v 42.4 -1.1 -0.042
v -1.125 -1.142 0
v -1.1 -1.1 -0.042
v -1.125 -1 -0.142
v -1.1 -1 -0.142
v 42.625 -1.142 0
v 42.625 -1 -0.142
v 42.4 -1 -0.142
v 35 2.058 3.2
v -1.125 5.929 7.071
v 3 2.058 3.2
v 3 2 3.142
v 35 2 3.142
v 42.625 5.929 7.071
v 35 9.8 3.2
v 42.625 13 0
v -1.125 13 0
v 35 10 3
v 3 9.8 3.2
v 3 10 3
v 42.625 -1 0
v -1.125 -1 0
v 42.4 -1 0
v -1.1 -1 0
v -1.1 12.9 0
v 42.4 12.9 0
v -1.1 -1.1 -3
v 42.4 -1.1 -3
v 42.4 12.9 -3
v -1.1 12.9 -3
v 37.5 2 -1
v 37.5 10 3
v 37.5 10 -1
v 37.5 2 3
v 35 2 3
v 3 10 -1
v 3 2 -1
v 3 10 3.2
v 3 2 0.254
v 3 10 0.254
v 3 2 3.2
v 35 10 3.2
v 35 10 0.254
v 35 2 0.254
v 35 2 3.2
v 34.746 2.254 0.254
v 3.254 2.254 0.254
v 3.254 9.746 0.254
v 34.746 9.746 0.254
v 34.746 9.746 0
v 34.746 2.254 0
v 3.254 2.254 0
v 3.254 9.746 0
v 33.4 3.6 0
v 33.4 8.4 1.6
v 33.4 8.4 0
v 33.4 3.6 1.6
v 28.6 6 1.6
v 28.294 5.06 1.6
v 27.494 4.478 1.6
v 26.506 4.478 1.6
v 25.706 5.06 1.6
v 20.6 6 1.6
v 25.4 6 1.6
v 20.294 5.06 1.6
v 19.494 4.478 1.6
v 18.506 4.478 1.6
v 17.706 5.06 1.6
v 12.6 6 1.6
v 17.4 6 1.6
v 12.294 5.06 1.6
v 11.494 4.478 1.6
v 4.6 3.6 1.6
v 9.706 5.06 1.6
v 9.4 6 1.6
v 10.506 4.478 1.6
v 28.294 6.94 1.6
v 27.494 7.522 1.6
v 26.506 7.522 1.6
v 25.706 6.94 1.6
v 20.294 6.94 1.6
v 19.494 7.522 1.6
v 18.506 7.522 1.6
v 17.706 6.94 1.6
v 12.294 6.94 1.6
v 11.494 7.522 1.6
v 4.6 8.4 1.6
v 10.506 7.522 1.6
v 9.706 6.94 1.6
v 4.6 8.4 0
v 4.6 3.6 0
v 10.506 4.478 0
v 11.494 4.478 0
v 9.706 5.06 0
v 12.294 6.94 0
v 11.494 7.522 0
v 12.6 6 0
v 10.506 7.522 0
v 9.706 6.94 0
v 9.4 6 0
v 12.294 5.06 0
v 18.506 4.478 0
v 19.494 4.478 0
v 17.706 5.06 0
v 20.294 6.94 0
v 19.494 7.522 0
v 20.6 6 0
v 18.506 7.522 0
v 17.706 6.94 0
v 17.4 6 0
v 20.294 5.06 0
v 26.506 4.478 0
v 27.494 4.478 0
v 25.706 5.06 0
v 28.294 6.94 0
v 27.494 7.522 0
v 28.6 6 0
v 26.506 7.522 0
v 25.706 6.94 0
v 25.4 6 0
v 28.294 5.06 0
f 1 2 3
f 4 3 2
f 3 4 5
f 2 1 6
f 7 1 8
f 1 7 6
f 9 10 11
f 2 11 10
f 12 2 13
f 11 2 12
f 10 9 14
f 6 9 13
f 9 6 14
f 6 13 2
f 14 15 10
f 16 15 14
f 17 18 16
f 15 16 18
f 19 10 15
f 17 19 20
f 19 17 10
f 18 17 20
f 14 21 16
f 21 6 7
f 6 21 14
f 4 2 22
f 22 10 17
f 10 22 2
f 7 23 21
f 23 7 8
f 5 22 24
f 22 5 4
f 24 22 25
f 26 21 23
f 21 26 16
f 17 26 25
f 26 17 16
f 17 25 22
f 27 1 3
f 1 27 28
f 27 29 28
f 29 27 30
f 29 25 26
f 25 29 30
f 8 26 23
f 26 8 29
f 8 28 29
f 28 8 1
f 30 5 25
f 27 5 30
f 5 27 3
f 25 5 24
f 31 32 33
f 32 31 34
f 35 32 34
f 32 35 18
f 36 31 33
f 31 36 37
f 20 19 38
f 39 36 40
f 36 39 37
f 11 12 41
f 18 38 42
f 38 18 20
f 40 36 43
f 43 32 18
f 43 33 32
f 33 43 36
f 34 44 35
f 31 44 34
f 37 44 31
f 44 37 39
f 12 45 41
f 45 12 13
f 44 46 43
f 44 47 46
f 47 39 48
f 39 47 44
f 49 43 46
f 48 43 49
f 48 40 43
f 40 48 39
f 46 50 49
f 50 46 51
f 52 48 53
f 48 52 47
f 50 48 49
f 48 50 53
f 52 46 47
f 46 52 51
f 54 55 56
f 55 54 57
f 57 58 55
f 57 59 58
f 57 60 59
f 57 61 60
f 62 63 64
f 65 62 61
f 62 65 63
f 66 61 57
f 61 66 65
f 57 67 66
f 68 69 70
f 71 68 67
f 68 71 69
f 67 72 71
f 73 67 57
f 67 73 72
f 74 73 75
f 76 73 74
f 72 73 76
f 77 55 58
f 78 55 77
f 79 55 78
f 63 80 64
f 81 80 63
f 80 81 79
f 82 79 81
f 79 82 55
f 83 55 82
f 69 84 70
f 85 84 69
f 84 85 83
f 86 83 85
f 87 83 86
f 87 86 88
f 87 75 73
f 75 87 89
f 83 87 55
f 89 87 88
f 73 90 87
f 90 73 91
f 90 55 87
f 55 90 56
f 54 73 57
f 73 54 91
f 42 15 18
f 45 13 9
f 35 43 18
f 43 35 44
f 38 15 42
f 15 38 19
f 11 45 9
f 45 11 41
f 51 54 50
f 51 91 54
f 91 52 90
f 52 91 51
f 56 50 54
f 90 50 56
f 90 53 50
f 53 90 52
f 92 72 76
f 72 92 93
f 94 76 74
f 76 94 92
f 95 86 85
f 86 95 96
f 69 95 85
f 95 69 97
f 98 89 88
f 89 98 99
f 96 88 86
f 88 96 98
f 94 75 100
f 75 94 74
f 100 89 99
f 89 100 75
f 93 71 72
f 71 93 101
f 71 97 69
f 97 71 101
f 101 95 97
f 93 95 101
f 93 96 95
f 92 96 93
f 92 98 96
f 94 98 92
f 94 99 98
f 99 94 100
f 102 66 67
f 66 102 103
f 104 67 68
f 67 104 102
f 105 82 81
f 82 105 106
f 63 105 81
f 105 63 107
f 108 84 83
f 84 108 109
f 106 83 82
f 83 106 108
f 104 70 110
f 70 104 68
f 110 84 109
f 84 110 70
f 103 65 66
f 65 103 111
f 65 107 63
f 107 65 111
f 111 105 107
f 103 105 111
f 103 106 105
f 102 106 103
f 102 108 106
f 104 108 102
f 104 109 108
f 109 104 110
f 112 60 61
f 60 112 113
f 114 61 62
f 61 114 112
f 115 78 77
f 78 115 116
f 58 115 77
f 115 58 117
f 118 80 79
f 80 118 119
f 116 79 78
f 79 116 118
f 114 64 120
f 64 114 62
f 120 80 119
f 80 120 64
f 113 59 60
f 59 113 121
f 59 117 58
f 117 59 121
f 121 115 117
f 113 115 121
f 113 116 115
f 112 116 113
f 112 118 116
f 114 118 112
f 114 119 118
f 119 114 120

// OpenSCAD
// file: ../OpenSCAD/brailleAndText.scad
/*
Braille Module
http://creativecommons.org/licenses/by/3.0/
*/


// mm sizes from http://dots.physics.orst.edu/gs_layout.html
radius = 0.25;
spacing = 2.5;
startOffset = 3.75;
distance = startOffset + spacing;

plate_height = 10;
plate_thickness = 10;   // was 2.

$fn = 10;



module letter(bitmap, char) {
//    echo(char);
	row_size = 2;
	col_size = 3;
	bitmap_size = row_size * col_size;
	
	function loc_x(loc) = floor(loc / row_size) * spacing + spacing;
	function loc_y(loc) = loc % row_size * spacing  + (distance-spacing)/2;

    translate([0, loc_y(-1), -2]) {
        rotate([270, 0, 90]) {
            linear_extrude(height = 1.25)
            text(char, 6);
        }
    }
	
    for (loc = [0:bitmap_size - 1]) {
		if (bitmap[loc] != 0) {
			union() {
				translate(v = [loc_x(loc), loc_y(loc), 0]) {
					sphere(radius = radius* bitmap[loc], center = true);
				}
			}
		}
	}
}


module braille_char(char) {
	if (char == "A" || char == "a") {
		letter([
			1,0,
			0,0,
			0,0
		], char);
	} else if (char == "B" || char == "b") {
		letter([
			1,0,
			1,0,
			0,0
		], char);
	} else if (char == "C" || char == "c") {
		letter([
			1,1,
			0,0,
			0,0
		], char);
	} else if (char == "D" || char == "d") {
		letter([
			1,1,
			0,1,
			0,0
		], char);
	} else if (char == "E" || char == "e") {
		letter([
			1,0,
			0,1,
			0,0
		], char);
	} else if (char == "F" || char == "f") {
		letter([
			1,1,
			1,0,
			0,0
		], char);
	} else if (char == "G" || char == "g") {
		letter([
			1,1,
			1,1,
			0,0
		], char);
	} else if (char == "H" || char == "h") {
		letter([
			1,0,
			1,1,
			0,0
		], char);
	} else if (char == "I" || char == "i") {
		letter([
			0,1,
			1,0,
			0,0
		], char);
	} else if (char == "J" || char == "j") {
		letter([
			0,1,
			1,1,
			0,0
		], char);
	} else if (char == "K" || char == "k") {
		letter([
			1,0,
			0,0,
			1,0
		], char);
	} else if (char == "L" || char == "l") {
		letter([
			1,0,
			1,0,
			1,0
		], char);
	} else if (char == "M" || char == "m") {
		letter([
			1,1,
			0,0,
			1,0
		], char);
	} else if (char == "N" || char == "n") {
		letter([
			1,1,
			0,1,
			1,0
		], char);
	} else if (char == "O" || char == "o") {
		letter([
			1,0,
			0,1,
			1,0
		], char);
	} else if (char == "P" || char == "p") {
		letter([
			1,1,
			1,0,
			1,0
		], char);
	} else if (char == "Q" || char == "q") {
		letter([
			1,1,
			1,1,
			1,0
		], char);
	} else if (char == "R" || char == "r") {
		letter([
			1,0,
			1,1,
			1,0
		], char);
	} else if (char == "S" || char == "s") {
		letter([
			0,1,
			1,0,
			1,0
		], char);
	} else if (char == "T" || char == "t") {
		letter([
			0,1,
			1,1,
			1,0
		], char);
	} else if (char == "U" || char == "u") {
		letter([
			1,0,
			0,0,
			1,1
		], char);
	} else if (char == "V" || char == "v") {
		letter([
			1,0,
			1,1,
			1,0
		], char);
	} else if (char == "W" || char == "w") {
		letter([
			0,1,
			1,1,
			0,1
		], char);
	} else if (char == "X" || char == "x") {
		letter([
			1,1,
			0,0,
			1,1
		], char);
	} else if (char == "Y" || char == "y") {
		letter([
			1,1,
			0,1,
			1,1
		], char);
	} else if (char == "Z" || char == "z") {
		letter([
			1,0,
			0,1,
			1,1
		], char);
    } else if (char == " ") {
		letter([
			0,0,
			0,0,
			0,0
		], char);
	} else {
		echo("Invalid Character: ", char);
	}

}

module braille_str(chars) {
    char_count = len(chars);
	echo(str("Total Width of ", chars, " : ",  distance * char_count, "mm"));
	union() {
		for (count = [0:char_count-1]) {
			translate(v = [0, count * distance, plate_thickness]) {
				braille_char(chars[count]);
			}
		}
		translate(v = [0, -distance/2, 0]) {
			color([0,0,1]) {
				cube(size = [plate_height, distance * (char_count+1), plate_thickness]);
			}
            }                                                      
	}
}

function lenText(txt="Hi") = distance * len(txt);

module printTextAndBraille(textToPrint) {
    blockLen = lenText(textToPrint);
    union()
    {
        difference() {                      // remove second box from first
            rotate([0,45,0]) {              // make it on its edge
                braille_str((textToPrint)); // make a long box
            }
            translate([0, -3.25, -8]) {     // move in right place
                cube(size = [14, (blockLen+8), 8]);
            }
        } 
        translate([0.1, -3.1, -3]) {     // move in right place
            cube(size = [14, (blockLen+6), 3]); 
        }
    }                                 
}

printTextAndBraille("HELLO CalLUM");
// file: ../openSCADLibs/lego_brick_builder.scad
/*

 Basic Lego brick builder module for OpenScad by Jorg Janssen 2013 (CC BY-NC 3.0) 
 To use this in your own projects add:

 use <path_to_this_file/lego_brick_builder.scad>
 brick (length, width, height [,smooth]);

 Length and width are in standard lego brick dimensions. 
 Height is in flat brick heights, so for a normal lego brick height = 3.
 Add optional smooth = true for a brick without studs. 
 Use height = 0 to just put studs/knobs on top of other things.

 */
$fn = 150;

// and this is how it's done:

FLU = 1.6; // Fundamental Lego Unit = 1.6 mm

BRICK_WIDTH = 5*FLU; // basic brick width
BRICK_HEIGHT = 6*FLU; // basic brick height
PLATE_HEIGHT = 2*FLU; // basic plate height
WALL_THICKNESS = FLU; // outer wall of the brick
STUD_RADIUS = 1.5*FLU; // studs are the small cylinders on top of the brick with the lego logo ('nopje' in Dutch)
STUD_HEIGHT = FLU; 
ANTI_STUD_RADIUS = 0.5*4.07*FLU;  // an anti stud is the hollow cylinder inside bricks that have length > 1 and width > 1
PIN_RADIUS = FLU; // a pin is the small cylinder inside bricks that have length = 1 or width = 1
SUPPORT_THICKNESS = 0.254; // support is the thin surface between anti studs, pins and walls, your printer might not print this thin, try thicker!
EDGE = 0.254; // this is the width and height of the bottom line edge of smooth bricks
CORRECTION = 0.1; // addition to each size, to make sure all parts connect by moving them a little inside each other

module brick(length = 4, width = 2, height = 3, smooth = false){

	// brick shell
	difference(){
		cube(size = [length*BRICK_WIDTH,width*BRICK_WIDTH,height*PLATE_HEIGHT]);
		translate([WALL_THICKNESS,WALL_THICKNESS,-WALL_THICKNESS])
		union(){
			cube(size = [length*BRICK_WIDTH-2*WALL_THICKNESS,width*BRICK_WIDTH-2*WALL_THICKNESS,height*PLATE_HEIGHT]);
			// stud inner holes, radius = pin radius
			if (!smooth) {
				translate([STUD_RADIUS+WALL_THICKNESS,STUD_RADIUS+WALL_THICKNESS,height*PLATE_HEIGHT])
				for (y = [0:width-1]){
					for (x = [0:length-1]){
						translate ([x*BRICK_WIDTH-WALL_THICKNESS,y*BRICK_WIDTH-WALL_THICKNESS,-CORRECTION])
						cylinder(h=WALL_THICKNESS+2*CORRECTION,r=PIN_RADIUS);
					}
				}
			}
			// small bottom line edge for smooth bricks
			else {
				translate([-WALL_THICKNESS-CORRECTION,-WALL_THICKNESS-CORRECTION,FLU-CORRECTION]) 
				difference() {
					cube([length*BRICK_WIDTH+2*CORRECTION,width*BRICK_WIDTH+2*CORRECTION,EDGE+CORRECTION]);
					translate([EDGE+CORRECTION,EDGE+CORRECTION,-CORRECTION])
					cube([length*BRICK_WIDTH-2*EDGE,width*BRICK_WIDTH-2*EDGE,EDGE+3*CORRECTION]); 
				}
			}
		}
	}
	// Studs
	if(!smooth){
		translate([STUD_RADIUS+WALL_THICKNESS,STUD_RADIUS+WALL_THICKNESS,height*PLATE_HEIGHT])
		for (y = [0:width-1]){
			for (x = [0:length-1]){
				translate ([x*BRICK_WIDTH,y*BRICK_WIDTH,-CORRECTION])
				difference(){
					cylinder(h=STUD_HEIGHT+CORRECTION, r=STUD_RADIUS);
					// Stud inner holes
					translate([0,0,-CORRECTION])
					cylinder(h=0.5*STUD_HEIGHT+CORRECTION,r=PIN_RADIUS);
				}
				// tech logo - disable this if your printer isn't capable of printing this small
				if ( length > width){
					translate([x*BRICK_WIDTH+0.8,y*BRICK_WIDTH-1.9,STUD_HEIGHT-CORRECTION])
					resize([1.2*1.7,2.2*1.7,0.254+CORRECTION])
					rotate(a=[0,0,90])
					import("tech.stl");
				}
				else {
					translate([x*BRICK_WIDTH-1.9,y*BRICK_WIDTH-0.8,STUD_HEIGHT-CORRECTION])
					resize([2.2*1.7,1.2*1.7,0.254+CORRECTION])
					import("tech.stl");				
				}				
				/* 
				// Alternative 2-square logo
				translate ([x*BRICK_WIDTH+CORRECTION,y*BRICK_WIDTH-CORRECTION,STUD_HEIGHT-CORRECTION])		
				cube([1,1,2*CORRECTION]);
				translate ([x*BRICK_WIDTH-0.9,y*BRICK_WIDTH-0.9,STUD_HEIGHT-CORRECTION])		
				cube([1,1,0.3]);
				*/				
			}
		}
	}
	// Pins x
	if (width == 1 && length > 1) {	
			for (x = [1:length-1]){
				translate([x*BRICK_WIDTH,0.5*BRICK_WIDTH,0])
				cylinder(h=height*PLATE_HEIGHT-WALL_THICKNESS+CORRECTION,r=PIN_RADIUS);
				// Supports
				if (height > 1) {
				translate([x*BRICK_WIDTH-0.5*SUPPORT_THICKNESS,CORRECTION,STUD_HEIGHT])
				cube(size=[SUPPORT_THICKNESS,BRICK_WIDTH-2*CORRECTION,height*PLATE_HEIGHT-STUD_HEIGHT-WALL_THICKNESS+CORRECTION]);
			}
		}
	}
	// Pins y
	if (length == 1 && width > 1) {	
			for (y = [1:width-1]){
			translate([0.5*BRICK_WIDTH,y*BRICK_WIDTH,0])
			cylinder(h=height*PLATE_HEIGHT-WALL_THICKNESS+CORRECTION,r=PIN_RADIUS);
			// Supports
			if (height > 1) {
			translate([CORRECTION,y*BRICK_WIDTH-0.5*SUPPORT_THICKNESS,STUD_HEIGHT])
			cube(size=[BRICK_WIDTH-2*CORRECTION,SUPPORT_THICKNESS,height*PLATE_HEIGHT-STUD_HEIGHT-WALL_THICKNESS+CORRECTION]);}
			
		}
	}
	// Anti Studs
	if (width > 1 && length > 1){
		difference(){
			union(){
				for(y = [1:width-1]){
					for(x = [1:length-1]){
						// anti studs
						translate([x*BRICK_WIDTH,y*BRICK_WIDTH,0])
						cylinder (h=height*PLATE_HEIGHT-WALL_THICKNESS+CORRECTION, r = ANTI_STUD_RADIUS);
						// Supports
						if (height > 1){
							// Support x
							if (x%2 == 0 && (length%2 == 0 || length%4 == 1 && x<length/2 || length%4 == 3 && x>length/2) || x%2 == 1 && (length%4 == 3 && x<length/2 || length%4 == 1 && x>length/2)) {
								translate([BRICK_WIDTH*x-0.5*SUPPORT_THICKNESS,y*BRICK_WIDTH-BRICK_WIDTH+WALL_THICKNESS-CORRECTION,STUD_HEIGHT])
								cube(size=[SUPPORT_THICKNESS,2*BRICK_WIDTH-2*WALL_THICKNESS,height*PLATE_HEIGHT-STUD_HEIGHT-WALL_THICKNESS+CORRECTION]);
							}
							// Supports y							
							if (y%2 == 0 && (width%2 == 0 || width%4 == 1 && y<width/2 || width%4 == 3 && y>width/2) || y%2 == 1 && (width%4 == 3 && y<width/2 || width%4 == 1 && y>width/2)) {
								translate([x*BRICK_WIDTH-BRICK_WIDTH+WALL_THICKNESS-CORRECTION,BRICK_WIDTH*y-0.5*SUPPORT_THICKNESS,STUD_HEIGHT])
								cube(size=[2*BRICK_WIDTH-2*WALL_THICKNESS,SUPPORT_THICKNESS,height*PLATE_HEIGHT-STUD_HEIGHT-WALL_THICKNESS+CORRECTION]);
							}
						}
					}
				}
			}
			union(){
				for(y = [1:width-1]){
					for(x = [1:length-1]){
						// hollow anti studs
						translate([x*BRICK_WIDTH,y*BRICK_WIDTH,-WALL_THICKNESS])
						cylinder (h=height*PLATE_HEIGHT, r = STUD_RADIUS);				
					}
				}
			}
		}		
	}
}
	
// file: ../OpenSCAD/TextAndBrailleLegoBlock.scad
 include <../openSCADLibs/lego_brick_builder.scad>
 include <../OpenSCAD/brailleAndText.scad>;

module brickAndText(text) {
    txtLen = distance * len(text);
    echo(distance);
    difference() {
        rotate([180,180,90])
            translate([-13, 2, 0])
                printTextAndBraille(text);
        translate([3, 2, -1]) 
            cube([txtLen - 3, BRICK_WIDTH, 4]);
    }
    translate([3,2,0])
        brick(floor(txtLen / BRICK_WIDTH),1,1, true);    
}

// use <../BPNodesV2/TextNBraille.scad>
//brickAndText("This is a test string");  
// main file
use <../OpenSCAD/TextAndBrailleLegoBlock.scad>

brickAndText("  1   ");
